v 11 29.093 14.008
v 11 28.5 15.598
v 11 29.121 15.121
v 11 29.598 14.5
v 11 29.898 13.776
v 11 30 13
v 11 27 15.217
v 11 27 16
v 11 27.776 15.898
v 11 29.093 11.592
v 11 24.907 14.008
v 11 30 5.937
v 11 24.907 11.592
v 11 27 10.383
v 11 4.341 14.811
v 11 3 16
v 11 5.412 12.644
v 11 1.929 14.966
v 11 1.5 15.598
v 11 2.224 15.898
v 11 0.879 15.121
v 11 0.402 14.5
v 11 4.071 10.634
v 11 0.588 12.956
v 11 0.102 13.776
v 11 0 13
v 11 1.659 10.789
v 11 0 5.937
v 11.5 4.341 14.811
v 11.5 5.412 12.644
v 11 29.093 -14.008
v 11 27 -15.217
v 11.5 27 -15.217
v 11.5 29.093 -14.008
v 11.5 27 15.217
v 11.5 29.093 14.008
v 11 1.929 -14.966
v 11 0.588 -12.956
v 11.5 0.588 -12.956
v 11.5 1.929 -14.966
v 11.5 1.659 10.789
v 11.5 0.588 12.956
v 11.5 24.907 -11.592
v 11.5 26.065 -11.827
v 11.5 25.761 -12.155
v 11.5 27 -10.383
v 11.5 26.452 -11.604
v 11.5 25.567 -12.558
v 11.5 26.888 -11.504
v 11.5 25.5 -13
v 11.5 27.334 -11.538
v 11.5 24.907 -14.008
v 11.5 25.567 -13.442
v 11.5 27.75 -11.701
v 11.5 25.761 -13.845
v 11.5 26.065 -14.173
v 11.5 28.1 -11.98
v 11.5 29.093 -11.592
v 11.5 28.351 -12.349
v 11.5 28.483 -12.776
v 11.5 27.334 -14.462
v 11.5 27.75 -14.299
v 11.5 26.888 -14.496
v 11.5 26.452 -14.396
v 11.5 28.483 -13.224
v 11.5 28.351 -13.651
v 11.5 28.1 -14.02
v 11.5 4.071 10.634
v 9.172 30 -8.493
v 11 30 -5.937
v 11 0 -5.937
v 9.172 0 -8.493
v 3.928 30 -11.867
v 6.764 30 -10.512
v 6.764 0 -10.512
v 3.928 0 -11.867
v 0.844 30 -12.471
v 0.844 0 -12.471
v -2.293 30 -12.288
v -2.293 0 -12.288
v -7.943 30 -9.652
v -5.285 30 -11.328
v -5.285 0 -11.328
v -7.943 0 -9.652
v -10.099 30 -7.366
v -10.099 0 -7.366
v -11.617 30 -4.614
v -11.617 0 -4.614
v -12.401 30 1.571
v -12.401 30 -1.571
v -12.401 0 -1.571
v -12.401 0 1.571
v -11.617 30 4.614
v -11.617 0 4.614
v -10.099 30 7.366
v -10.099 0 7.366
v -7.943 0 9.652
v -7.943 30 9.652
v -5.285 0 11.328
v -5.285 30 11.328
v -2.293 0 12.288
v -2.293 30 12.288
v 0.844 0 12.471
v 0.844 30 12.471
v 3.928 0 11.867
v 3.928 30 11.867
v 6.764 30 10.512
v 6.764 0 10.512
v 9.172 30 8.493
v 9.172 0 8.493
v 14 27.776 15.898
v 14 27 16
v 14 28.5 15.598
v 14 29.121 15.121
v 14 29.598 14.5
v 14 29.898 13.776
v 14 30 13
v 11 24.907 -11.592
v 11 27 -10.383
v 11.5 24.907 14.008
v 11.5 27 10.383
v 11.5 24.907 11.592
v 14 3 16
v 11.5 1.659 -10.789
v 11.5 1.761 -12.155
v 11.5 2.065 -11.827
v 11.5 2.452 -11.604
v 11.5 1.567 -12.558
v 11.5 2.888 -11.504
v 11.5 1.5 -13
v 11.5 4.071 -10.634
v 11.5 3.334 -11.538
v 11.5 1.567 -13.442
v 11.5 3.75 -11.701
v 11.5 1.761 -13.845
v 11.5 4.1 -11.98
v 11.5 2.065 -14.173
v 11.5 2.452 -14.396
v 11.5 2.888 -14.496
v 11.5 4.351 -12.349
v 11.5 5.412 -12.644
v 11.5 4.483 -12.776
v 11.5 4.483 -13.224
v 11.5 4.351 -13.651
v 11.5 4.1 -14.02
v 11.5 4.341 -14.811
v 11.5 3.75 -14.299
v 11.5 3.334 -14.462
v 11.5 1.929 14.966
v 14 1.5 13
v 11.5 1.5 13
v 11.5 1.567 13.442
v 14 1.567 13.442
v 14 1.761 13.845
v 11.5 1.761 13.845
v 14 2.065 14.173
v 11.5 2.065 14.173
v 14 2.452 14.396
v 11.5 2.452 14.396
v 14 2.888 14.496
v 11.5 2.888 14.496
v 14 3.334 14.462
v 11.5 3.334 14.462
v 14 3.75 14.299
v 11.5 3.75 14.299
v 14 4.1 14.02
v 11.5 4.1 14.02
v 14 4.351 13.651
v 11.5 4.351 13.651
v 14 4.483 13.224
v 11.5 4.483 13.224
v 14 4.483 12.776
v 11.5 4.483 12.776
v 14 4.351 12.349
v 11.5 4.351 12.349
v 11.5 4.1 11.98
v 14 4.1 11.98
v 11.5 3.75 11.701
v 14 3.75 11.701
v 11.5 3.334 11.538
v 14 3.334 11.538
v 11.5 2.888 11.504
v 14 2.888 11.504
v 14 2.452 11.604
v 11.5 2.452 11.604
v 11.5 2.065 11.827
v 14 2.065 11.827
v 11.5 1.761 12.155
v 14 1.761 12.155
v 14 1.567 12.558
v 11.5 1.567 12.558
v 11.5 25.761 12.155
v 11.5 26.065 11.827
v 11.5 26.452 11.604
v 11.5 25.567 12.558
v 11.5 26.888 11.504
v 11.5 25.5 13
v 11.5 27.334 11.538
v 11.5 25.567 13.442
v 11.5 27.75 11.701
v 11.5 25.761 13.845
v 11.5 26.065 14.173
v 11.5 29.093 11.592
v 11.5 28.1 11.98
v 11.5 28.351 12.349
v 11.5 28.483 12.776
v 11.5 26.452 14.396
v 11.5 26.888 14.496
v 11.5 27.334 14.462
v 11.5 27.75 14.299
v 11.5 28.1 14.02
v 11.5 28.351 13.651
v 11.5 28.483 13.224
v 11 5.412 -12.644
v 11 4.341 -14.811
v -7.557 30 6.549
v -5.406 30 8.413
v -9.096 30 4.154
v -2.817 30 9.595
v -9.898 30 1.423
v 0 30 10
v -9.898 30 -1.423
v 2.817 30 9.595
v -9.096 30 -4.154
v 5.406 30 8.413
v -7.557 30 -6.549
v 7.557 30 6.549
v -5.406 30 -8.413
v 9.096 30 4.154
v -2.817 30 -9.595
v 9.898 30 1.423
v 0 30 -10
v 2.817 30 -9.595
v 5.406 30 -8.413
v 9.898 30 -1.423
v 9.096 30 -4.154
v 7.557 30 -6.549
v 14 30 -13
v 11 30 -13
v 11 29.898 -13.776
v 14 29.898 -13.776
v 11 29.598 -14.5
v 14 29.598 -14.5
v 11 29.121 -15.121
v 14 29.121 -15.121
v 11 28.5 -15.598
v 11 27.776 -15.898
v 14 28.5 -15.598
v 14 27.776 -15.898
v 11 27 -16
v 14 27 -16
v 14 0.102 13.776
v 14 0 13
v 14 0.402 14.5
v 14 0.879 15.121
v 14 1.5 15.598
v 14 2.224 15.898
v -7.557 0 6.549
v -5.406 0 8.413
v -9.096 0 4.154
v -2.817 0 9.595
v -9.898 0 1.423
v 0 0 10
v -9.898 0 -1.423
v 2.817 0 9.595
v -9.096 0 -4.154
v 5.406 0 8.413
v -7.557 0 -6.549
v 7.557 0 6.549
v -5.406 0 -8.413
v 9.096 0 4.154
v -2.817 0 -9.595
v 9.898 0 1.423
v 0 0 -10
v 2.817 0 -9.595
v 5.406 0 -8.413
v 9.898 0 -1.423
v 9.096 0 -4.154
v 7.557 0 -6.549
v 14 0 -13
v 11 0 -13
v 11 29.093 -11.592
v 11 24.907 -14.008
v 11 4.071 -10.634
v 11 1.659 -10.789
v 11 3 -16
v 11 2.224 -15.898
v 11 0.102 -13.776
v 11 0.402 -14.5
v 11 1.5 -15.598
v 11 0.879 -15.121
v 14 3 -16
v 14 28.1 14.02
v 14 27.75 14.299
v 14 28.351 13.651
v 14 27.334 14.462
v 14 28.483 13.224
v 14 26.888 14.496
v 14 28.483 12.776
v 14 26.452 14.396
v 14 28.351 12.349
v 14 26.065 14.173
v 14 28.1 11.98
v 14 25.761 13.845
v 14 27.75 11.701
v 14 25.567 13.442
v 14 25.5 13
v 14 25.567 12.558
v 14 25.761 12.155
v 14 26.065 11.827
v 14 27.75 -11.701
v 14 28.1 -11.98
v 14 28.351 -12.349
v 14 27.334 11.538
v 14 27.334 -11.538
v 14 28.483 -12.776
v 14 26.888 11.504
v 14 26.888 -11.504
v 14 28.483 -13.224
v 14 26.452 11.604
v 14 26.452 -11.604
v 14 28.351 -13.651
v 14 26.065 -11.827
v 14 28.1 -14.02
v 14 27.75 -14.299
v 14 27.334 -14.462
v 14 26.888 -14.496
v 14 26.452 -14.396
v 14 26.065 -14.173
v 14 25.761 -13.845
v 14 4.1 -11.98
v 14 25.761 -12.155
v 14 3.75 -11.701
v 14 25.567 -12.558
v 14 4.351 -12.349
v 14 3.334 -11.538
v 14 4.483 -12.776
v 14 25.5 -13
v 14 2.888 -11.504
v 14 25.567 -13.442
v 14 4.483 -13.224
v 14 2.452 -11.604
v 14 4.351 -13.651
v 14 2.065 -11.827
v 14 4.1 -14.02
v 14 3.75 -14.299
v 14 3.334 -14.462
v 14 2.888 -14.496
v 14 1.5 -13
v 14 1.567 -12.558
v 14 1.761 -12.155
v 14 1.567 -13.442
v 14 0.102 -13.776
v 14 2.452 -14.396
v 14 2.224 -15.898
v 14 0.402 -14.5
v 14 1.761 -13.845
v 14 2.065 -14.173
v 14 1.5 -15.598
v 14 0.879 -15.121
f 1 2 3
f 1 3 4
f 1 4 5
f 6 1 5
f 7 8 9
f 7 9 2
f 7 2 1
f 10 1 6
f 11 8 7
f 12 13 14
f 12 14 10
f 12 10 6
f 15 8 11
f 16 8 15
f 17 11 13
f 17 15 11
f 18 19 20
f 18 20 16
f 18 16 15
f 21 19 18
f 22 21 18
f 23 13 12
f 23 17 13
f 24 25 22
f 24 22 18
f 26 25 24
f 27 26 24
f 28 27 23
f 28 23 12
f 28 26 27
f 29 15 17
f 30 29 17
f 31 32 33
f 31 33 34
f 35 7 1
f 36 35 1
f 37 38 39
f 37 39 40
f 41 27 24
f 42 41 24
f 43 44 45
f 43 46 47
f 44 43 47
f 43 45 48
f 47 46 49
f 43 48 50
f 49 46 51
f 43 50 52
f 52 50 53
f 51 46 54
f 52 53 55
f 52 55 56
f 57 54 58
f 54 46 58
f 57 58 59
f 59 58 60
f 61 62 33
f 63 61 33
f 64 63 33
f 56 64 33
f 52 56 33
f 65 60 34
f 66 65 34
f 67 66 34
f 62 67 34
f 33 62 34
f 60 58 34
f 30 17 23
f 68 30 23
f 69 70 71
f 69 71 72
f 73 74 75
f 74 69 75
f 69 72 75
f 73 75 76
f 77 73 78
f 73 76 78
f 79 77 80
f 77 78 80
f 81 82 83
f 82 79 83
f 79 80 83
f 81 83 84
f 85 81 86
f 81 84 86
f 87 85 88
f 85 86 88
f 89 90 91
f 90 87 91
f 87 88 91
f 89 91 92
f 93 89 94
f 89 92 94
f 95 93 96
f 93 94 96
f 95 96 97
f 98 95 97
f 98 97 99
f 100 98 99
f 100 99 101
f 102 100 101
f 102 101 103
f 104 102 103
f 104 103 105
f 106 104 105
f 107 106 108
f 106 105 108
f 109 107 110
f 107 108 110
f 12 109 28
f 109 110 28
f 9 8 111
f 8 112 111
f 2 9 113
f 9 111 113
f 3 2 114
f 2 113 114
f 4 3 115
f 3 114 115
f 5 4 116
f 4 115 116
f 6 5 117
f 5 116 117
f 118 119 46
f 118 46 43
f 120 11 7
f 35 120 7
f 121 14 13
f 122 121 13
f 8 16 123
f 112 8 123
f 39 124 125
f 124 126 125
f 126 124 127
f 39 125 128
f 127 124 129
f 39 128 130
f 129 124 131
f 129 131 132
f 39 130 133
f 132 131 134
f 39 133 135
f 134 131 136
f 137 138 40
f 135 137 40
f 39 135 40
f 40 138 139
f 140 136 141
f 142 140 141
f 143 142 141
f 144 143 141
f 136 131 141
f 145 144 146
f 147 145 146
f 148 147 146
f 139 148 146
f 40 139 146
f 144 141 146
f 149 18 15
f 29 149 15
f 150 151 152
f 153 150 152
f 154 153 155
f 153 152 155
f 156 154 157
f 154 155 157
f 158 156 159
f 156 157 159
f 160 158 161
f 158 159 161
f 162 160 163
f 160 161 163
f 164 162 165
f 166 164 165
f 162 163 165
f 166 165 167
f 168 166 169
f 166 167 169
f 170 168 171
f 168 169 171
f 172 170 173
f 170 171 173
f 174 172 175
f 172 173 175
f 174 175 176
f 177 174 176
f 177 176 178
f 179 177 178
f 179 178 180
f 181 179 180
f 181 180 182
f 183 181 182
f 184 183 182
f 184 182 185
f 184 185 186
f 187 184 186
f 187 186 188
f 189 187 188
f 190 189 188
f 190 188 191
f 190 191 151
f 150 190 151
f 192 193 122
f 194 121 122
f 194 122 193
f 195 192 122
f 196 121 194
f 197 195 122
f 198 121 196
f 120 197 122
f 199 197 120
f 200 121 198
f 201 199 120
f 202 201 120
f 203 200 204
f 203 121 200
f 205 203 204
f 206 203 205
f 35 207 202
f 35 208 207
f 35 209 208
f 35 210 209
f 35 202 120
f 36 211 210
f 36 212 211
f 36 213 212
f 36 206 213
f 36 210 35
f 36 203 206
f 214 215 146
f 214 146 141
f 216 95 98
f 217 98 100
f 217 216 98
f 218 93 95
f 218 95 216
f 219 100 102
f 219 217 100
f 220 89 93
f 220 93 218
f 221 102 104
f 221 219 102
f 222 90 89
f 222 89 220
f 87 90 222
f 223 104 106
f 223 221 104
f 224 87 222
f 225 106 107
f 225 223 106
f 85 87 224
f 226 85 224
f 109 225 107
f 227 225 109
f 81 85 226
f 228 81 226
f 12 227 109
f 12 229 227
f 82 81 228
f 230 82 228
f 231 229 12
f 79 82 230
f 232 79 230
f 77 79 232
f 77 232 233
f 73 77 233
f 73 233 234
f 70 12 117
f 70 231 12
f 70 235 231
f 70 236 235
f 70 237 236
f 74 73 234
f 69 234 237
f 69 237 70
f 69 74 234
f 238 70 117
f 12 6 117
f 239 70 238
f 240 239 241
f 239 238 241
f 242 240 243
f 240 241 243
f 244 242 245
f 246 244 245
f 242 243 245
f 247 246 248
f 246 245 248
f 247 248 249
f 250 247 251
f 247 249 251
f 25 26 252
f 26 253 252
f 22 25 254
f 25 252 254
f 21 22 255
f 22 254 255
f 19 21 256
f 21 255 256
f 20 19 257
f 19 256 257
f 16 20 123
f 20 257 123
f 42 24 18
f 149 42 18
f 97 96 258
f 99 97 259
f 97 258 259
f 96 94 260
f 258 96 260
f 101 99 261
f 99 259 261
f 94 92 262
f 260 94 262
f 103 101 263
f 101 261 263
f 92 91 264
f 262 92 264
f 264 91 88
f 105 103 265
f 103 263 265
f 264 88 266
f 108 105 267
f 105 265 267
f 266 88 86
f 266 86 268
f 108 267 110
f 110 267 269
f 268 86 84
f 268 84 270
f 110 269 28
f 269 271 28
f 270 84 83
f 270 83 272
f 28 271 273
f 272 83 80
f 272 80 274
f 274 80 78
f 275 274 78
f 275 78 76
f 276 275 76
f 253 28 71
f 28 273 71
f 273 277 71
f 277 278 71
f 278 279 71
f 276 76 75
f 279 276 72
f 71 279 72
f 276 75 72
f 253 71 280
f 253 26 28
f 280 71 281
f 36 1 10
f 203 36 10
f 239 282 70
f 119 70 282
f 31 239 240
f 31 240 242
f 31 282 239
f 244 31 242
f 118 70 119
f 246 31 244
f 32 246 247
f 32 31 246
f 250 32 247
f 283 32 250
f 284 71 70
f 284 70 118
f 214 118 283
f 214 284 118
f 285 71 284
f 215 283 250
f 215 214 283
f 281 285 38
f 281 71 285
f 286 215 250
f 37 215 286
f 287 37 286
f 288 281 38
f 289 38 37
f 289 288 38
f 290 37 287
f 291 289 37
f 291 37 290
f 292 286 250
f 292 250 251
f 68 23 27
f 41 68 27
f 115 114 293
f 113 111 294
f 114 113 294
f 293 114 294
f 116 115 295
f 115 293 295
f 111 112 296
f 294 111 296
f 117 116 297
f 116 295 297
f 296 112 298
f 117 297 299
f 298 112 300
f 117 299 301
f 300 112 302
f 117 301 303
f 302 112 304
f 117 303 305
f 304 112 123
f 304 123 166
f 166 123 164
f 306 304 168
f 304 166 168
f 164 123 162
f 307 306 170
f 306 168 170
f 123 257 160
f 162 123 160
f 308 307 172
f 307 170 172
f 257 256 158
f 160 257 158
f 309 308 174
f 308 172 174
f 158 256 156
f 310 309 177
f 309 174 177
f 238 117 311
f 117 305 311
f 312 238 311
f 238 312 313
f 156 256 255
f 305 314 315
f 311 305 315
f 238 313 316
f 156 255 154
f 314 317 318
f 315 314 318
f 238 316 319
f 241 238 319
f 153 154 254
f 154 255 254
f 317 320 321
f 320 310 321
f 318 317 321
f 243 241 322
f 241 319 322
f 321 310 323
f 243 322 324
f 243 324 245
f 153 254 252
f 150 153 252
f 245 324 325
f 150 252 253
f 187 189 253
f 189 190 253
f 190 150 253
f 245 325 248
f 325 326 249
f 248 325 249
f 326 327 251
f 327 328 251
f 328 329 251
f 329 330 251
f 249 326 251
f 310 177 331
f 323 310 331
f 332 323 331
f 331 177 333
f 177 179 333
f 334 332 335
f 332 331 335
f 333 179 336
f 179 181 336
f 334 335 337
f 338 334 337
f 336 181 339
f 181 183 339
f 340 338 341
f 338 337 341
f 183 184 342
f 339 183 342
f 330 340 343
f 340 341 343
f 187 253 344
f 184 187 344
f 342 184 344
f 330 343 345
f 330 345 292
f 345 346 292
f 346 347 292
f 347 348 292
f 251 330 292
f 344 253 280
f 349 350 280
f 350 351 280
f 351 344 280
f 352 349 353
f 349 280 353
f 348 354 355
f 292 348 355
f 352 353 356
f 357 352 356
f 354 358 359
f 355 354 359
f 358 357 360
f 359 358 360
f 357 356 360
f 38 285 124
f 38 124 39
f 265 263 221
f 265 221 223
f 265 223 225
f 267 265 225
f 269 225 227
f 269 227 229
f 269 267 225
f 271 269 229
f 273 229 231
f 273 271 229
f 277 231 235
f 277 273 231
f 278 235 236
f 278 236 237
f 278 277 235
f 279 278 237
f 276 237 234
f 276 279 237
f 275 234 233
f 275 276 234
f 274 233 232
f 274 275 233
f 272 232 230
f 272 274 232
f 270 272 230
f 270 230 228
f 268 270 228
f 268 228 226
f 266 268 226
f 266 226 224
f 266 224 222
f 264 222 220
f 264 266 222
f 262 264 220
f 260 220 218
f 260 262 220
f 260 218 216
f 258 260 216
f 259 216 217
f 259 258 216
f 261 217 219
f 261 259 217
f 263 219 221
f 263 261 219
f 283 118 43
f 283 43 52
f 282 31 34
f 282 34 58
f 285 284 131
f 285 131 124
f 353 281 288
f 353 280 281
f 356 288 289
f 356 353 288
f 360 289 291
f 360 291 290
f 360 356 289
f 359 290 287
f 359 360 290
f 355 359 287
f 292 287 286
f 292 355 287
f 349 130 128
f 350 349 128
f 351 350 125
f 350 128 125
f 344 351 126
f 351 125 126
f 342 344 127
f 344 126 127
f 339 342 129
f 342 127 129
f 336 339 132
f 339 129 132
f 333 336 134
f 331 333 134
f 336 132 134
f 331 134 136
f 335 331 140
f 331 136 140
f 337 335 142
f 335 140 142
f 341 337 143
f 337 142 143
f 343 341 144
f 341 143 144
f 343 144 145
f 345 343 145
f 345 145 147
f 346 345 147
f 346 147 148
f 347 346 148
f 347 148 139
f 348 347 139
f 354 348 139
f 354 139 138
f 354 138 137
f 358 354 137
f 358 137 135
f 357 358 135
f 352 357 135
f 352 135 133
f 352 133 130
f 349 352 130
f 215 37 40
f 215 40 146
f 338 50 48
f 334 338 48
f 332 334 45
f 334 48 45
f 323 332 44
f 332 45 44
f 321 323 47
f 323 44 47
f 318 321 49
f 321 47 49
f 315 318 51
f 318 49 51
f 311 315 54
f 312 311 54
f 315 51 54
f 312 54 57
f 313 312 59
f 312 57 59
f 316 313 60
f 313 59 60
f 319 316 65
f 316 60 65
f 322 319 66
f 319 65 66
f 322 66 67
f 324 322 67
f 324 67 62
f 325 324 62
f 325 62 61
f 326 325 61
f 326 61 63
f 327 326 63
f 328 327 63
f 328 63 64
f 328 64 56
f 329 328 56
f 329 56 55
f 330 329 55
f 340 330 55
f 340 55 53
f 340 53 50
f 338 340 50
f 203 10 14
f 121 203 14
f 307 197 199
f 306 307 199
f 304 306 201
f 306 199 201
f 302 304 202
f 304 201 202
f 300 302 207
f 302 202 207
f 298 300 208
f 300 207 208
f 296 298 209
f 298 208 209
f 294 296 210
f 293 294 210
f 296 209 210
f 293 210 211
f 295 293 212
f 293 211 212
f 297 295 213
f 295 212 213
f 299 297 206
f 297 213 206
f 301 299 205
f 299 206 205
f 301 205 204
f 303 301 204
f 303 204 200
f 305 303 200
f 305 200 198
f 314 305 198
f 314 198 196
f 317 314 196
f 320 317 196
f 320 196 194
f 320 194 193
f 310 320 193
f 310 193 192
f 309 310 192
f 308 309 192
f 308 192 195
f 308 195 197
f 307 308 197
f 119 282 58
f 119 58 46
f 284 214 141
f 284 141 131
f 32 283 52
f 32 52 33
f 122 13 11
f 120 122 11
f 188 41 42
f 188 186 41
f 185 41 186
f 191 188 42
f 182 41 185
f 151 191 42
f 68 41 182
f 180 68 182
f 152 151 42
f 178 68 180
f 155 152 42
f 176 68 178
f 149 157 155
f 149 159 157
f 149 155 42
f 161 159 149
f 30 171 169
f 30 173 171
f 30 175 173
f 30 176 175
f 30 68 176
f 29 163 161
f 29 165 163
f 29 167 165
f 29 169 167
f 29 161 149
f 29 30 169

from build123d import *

# Parameters (mm, degrees)
SKETCH_1_R          = 12.5
SKETCH_1_R_2        = 10
EXTRUDE_1_DEPTH     = 30
SKETCH_2_W          = 3
SKETCH_2_H          = 32
EXTRUDE_2_DEPTH     = 30
CUT_EXTRUDE_2_DEPTH = 0.5
SKETCH_5_R          = 1.5
CUT_EXTRUDE_3_DEPTH = 42.617304093
FILLET_1_R          = 3


with BuildPart() as part:
    # 草图1 → 凸台-拉伸1 (new body)
    with BuildSketch(Plane(origin=(0, 0, 0), x_dir=(1, 0, 0), z_dir=(0, 1, 0))):
        with Locations(Location((0, 0, 0), (0, 0, 270))):
            Circle(SKETCH_1_R)
        with Locations(Location((0, 0, 0), (0, 0, 270))):
            Circle(SKETCH_1_R_2, mode=Mode.SUBTRACT)
    extrude(amount=EXTRUDE_1_DEPTH)

    # 草图2 → 凸台-拉伸2 (add)
    with BuildSketch(Plane(origin=(0, 0, 0), x_dir=(1, 0, 0), z_dir=(0, 1, 0))):
        with Locations((12.5, 0)):
            Rectangle(SKETCH_2_W, SKETCH_2_H)
    extrude(amount=EXTRUDE_2_DEPTH)

    # 草图4 → 切除-拉伸2 (cut)
    with BuildSketch(Plane.ZY.offset(-11)):
        Polygon((15.216666667, 27), (14.008333333, 29.092894726), (11.591666667, 29.092894726), (10.383333333, 27), (11.591666667, 24.907105274), (14.008333333, 24.907105274), align=None)
        Polygon((-10.78933236, 1.659293687), (-12.955751906, 0.588357588), (-14.966419546, 1.929063901), (-14.81066764, 4.340706313), (-12.644248094, 5.411642412), (-10.633580454, 4.070936099), align=None)
        Polygon((12.955751906, 0.588357588), (14.966419546, 1.929063901), (14.81066764, 4.340706313), (12.644248094, 5.411642412), (10.633580454, 4.070936099), (10.78933236, 1.659293687), align=None)
        Polygon((-14.008333333, 24.907105274), (-15.216666667, 27), (-14.008333333, 29.092894726), (-11.591666667, 29.092894726), (-10.383333333, 27), (-11.591666667, 24.907105274), align=None)
    extrude(amount=-CUT_EXTRUDE_2_DEPTH, mode=Mode.SUBTRACT)

    # 草图5 → 切除-拉伸3 (cut, through all)
    with BuildSketch(Plane.ZY.offset(-11.5)):
        with Locations(Location((-13, 27, 0), (0, 0, 270))):
            Circle(SKETCH_5_R)
        with Locations(Location((13, 27, 0), (0, 0, 270))):
            Circle(SKETCH_5_R)
        with Locations(Location((13, 3, 0), (0, 0, 270))):
            Circle(SKETCH_5_R)
        with Locations(Location((-13, 3, 0), (0, 0, 270))):
            Circle(SKETCH_5_R)
    extrude(amount=-CUT_EXTRUDE_3_DEPTH, mode=Mode.SUBTRACT)

    # 圆角1
    fillet_1_edges = [part.edges().sort_by_distance(p)[0] for p in [
        (12.5, 30, 16),
        (12.5, 30, -16),
        (12.5, 0, -16),
        (12.5, 0, 16),
    ]]
    fillet(fillet_1_edges, radius=FILLET_1_R)


solid = part.part
